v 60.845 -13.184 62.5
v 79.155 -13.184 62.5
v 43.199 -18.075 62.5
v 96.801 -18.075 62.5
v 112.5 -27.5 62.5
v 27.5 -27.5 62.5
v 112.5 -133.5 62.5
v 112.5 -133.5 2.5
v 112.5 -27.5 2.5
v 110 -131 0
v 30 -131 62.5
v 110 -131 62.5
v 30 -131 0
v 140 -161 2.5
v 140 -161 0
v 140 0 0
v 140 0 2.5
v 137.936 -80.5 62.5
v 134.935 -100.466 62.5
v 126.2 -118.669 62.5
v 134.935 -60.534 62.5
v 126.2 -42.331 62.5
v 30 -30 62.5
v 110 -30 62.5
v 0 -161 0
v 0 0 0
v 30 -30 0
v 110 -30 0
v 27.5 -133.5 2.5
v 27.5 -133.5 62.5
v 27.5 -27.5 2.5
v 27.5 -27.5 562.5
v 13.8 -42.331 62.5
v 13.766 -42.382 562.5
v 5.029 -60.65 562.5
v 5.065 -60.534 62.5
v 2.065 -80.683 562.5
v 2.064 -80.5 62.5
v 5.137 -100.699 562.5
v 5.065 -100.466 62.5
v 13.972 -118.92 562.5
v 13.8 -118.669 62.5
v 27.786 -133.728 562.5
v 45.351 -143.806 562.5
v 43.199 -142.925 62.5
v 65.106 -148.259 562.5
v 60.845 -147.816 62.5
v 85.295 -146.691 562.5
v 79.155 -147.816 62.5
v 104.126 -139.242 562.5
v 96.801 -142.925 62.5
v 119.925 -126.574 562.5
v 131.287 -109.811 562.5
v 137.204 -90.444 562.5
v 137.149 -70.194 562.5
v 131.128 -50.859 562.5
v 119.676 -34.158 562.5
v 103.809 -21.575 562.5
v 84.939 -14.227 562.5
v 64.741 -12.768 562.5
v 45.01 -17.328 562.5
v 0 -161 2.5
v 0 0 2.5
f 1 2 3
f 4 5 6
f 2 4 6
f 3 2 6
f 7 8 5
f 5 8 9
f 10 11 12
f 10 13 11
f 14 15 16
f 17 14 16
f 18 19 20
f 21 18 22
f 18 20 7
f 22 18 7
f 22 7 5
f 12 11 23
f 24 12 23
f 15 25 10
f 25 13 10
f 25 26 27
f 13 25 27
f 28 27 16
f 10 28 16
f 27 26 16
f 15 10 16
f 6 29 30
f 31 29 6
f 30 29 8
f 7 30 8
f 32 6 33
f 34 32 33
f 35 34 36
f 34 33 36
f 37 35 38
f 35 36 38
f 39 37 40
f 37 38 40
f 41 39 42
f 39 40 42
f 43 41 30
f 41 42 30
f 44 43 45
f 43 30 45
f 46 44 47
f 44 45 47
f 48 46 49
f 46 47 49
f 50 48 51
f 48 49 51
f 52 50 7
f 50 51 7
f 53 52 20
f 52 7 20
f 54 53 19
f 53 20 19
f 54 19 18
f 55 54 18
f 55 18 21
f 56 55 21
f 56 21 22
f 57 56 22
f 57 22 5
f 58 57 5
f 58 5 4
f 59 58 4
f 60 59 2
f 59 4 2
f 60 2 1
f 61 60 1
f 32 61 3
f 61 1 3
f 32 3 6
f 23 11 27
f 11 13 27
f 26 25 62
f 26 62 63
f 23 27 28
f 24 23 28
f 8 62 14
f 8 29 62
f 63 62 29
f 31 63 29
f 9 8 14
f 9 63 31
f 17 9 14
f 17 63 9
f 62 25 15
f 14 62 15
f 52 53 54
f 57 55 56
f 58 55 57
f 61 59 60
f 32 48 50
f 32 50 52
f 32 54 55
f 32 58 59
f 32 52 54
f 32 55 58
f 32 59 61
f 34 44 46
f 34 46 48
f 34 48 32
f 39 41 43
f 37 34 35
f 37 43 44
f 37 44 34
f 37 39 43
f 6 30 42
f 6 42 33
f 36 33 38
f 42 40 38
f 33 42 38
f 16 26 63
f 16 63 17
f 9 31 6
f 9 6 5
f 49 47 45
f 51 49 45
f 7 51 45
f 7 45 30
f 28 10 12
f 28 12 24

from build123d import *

# Parameters (mm, degrees)
CROQUIS1_W              = 140
CROQUIS1_H              = 161
CROQUIS1_W_2            = 80
CROQUIS1_H_2            = 101
SALIENTE_EXTRUIR1_DEPTH = 2.5
CROQUIS2_W              = 85
CROQUIS2_H              = 106
CROQUIS2_W_2            = 80
CROQUIS2_H_2            = 101
SALIENTE_EXTRUIR2_DEPTH = 60
CROQUIS3_R              = 67.935631299
SALIENTE_EXTRUIR3_DEPTH = 500


with BuildPart() as part:
    # Croquis1 → Saliente-Extruir1 (new body)
    with BuildSketch(Plane.XY):
        with Locations((70, -80.5)):
            Rectangle(CROQUIS1_W, CROQUIS1_H)
        with Locations((70, -80.5)):
            Rectangle(CROQUIS1_W_2, CROQUIS1_H_2, mode=Mode.SUBTRACT)
    extrude(amount=SALIENTE_EXTRUIR1_DEPTH)

    # Croquis2 → Saliente-Extruir2 (add)
    with BuildSketch(Plane.XY.offset(2.5)):
        with Locations((70, -80.5)):
            Rectangle(CROQUIS2_W, CROQUIS2_H)
        with Locations((70, -80.5)):
            Rectangle(CROQUIS2_W_2, CROQUIS2_H_2, mode=Mode.SUBTRACT)
    extrude(amount=SALIENTE_EXTRUIR2_DEPTH)

    # Croquis3 → Saliente-Extruir3 (add)
    with BuildSketch(Plane.XY.offset(62.5)):
        with Locations(Location((70, -80.5, 0), (0, 0, 128.725665443))):
            Circle(CROQUIS3_R)
    extrude(amount=SALIENTE_EXTRUIR3_DEPTH)


solid = part.part
